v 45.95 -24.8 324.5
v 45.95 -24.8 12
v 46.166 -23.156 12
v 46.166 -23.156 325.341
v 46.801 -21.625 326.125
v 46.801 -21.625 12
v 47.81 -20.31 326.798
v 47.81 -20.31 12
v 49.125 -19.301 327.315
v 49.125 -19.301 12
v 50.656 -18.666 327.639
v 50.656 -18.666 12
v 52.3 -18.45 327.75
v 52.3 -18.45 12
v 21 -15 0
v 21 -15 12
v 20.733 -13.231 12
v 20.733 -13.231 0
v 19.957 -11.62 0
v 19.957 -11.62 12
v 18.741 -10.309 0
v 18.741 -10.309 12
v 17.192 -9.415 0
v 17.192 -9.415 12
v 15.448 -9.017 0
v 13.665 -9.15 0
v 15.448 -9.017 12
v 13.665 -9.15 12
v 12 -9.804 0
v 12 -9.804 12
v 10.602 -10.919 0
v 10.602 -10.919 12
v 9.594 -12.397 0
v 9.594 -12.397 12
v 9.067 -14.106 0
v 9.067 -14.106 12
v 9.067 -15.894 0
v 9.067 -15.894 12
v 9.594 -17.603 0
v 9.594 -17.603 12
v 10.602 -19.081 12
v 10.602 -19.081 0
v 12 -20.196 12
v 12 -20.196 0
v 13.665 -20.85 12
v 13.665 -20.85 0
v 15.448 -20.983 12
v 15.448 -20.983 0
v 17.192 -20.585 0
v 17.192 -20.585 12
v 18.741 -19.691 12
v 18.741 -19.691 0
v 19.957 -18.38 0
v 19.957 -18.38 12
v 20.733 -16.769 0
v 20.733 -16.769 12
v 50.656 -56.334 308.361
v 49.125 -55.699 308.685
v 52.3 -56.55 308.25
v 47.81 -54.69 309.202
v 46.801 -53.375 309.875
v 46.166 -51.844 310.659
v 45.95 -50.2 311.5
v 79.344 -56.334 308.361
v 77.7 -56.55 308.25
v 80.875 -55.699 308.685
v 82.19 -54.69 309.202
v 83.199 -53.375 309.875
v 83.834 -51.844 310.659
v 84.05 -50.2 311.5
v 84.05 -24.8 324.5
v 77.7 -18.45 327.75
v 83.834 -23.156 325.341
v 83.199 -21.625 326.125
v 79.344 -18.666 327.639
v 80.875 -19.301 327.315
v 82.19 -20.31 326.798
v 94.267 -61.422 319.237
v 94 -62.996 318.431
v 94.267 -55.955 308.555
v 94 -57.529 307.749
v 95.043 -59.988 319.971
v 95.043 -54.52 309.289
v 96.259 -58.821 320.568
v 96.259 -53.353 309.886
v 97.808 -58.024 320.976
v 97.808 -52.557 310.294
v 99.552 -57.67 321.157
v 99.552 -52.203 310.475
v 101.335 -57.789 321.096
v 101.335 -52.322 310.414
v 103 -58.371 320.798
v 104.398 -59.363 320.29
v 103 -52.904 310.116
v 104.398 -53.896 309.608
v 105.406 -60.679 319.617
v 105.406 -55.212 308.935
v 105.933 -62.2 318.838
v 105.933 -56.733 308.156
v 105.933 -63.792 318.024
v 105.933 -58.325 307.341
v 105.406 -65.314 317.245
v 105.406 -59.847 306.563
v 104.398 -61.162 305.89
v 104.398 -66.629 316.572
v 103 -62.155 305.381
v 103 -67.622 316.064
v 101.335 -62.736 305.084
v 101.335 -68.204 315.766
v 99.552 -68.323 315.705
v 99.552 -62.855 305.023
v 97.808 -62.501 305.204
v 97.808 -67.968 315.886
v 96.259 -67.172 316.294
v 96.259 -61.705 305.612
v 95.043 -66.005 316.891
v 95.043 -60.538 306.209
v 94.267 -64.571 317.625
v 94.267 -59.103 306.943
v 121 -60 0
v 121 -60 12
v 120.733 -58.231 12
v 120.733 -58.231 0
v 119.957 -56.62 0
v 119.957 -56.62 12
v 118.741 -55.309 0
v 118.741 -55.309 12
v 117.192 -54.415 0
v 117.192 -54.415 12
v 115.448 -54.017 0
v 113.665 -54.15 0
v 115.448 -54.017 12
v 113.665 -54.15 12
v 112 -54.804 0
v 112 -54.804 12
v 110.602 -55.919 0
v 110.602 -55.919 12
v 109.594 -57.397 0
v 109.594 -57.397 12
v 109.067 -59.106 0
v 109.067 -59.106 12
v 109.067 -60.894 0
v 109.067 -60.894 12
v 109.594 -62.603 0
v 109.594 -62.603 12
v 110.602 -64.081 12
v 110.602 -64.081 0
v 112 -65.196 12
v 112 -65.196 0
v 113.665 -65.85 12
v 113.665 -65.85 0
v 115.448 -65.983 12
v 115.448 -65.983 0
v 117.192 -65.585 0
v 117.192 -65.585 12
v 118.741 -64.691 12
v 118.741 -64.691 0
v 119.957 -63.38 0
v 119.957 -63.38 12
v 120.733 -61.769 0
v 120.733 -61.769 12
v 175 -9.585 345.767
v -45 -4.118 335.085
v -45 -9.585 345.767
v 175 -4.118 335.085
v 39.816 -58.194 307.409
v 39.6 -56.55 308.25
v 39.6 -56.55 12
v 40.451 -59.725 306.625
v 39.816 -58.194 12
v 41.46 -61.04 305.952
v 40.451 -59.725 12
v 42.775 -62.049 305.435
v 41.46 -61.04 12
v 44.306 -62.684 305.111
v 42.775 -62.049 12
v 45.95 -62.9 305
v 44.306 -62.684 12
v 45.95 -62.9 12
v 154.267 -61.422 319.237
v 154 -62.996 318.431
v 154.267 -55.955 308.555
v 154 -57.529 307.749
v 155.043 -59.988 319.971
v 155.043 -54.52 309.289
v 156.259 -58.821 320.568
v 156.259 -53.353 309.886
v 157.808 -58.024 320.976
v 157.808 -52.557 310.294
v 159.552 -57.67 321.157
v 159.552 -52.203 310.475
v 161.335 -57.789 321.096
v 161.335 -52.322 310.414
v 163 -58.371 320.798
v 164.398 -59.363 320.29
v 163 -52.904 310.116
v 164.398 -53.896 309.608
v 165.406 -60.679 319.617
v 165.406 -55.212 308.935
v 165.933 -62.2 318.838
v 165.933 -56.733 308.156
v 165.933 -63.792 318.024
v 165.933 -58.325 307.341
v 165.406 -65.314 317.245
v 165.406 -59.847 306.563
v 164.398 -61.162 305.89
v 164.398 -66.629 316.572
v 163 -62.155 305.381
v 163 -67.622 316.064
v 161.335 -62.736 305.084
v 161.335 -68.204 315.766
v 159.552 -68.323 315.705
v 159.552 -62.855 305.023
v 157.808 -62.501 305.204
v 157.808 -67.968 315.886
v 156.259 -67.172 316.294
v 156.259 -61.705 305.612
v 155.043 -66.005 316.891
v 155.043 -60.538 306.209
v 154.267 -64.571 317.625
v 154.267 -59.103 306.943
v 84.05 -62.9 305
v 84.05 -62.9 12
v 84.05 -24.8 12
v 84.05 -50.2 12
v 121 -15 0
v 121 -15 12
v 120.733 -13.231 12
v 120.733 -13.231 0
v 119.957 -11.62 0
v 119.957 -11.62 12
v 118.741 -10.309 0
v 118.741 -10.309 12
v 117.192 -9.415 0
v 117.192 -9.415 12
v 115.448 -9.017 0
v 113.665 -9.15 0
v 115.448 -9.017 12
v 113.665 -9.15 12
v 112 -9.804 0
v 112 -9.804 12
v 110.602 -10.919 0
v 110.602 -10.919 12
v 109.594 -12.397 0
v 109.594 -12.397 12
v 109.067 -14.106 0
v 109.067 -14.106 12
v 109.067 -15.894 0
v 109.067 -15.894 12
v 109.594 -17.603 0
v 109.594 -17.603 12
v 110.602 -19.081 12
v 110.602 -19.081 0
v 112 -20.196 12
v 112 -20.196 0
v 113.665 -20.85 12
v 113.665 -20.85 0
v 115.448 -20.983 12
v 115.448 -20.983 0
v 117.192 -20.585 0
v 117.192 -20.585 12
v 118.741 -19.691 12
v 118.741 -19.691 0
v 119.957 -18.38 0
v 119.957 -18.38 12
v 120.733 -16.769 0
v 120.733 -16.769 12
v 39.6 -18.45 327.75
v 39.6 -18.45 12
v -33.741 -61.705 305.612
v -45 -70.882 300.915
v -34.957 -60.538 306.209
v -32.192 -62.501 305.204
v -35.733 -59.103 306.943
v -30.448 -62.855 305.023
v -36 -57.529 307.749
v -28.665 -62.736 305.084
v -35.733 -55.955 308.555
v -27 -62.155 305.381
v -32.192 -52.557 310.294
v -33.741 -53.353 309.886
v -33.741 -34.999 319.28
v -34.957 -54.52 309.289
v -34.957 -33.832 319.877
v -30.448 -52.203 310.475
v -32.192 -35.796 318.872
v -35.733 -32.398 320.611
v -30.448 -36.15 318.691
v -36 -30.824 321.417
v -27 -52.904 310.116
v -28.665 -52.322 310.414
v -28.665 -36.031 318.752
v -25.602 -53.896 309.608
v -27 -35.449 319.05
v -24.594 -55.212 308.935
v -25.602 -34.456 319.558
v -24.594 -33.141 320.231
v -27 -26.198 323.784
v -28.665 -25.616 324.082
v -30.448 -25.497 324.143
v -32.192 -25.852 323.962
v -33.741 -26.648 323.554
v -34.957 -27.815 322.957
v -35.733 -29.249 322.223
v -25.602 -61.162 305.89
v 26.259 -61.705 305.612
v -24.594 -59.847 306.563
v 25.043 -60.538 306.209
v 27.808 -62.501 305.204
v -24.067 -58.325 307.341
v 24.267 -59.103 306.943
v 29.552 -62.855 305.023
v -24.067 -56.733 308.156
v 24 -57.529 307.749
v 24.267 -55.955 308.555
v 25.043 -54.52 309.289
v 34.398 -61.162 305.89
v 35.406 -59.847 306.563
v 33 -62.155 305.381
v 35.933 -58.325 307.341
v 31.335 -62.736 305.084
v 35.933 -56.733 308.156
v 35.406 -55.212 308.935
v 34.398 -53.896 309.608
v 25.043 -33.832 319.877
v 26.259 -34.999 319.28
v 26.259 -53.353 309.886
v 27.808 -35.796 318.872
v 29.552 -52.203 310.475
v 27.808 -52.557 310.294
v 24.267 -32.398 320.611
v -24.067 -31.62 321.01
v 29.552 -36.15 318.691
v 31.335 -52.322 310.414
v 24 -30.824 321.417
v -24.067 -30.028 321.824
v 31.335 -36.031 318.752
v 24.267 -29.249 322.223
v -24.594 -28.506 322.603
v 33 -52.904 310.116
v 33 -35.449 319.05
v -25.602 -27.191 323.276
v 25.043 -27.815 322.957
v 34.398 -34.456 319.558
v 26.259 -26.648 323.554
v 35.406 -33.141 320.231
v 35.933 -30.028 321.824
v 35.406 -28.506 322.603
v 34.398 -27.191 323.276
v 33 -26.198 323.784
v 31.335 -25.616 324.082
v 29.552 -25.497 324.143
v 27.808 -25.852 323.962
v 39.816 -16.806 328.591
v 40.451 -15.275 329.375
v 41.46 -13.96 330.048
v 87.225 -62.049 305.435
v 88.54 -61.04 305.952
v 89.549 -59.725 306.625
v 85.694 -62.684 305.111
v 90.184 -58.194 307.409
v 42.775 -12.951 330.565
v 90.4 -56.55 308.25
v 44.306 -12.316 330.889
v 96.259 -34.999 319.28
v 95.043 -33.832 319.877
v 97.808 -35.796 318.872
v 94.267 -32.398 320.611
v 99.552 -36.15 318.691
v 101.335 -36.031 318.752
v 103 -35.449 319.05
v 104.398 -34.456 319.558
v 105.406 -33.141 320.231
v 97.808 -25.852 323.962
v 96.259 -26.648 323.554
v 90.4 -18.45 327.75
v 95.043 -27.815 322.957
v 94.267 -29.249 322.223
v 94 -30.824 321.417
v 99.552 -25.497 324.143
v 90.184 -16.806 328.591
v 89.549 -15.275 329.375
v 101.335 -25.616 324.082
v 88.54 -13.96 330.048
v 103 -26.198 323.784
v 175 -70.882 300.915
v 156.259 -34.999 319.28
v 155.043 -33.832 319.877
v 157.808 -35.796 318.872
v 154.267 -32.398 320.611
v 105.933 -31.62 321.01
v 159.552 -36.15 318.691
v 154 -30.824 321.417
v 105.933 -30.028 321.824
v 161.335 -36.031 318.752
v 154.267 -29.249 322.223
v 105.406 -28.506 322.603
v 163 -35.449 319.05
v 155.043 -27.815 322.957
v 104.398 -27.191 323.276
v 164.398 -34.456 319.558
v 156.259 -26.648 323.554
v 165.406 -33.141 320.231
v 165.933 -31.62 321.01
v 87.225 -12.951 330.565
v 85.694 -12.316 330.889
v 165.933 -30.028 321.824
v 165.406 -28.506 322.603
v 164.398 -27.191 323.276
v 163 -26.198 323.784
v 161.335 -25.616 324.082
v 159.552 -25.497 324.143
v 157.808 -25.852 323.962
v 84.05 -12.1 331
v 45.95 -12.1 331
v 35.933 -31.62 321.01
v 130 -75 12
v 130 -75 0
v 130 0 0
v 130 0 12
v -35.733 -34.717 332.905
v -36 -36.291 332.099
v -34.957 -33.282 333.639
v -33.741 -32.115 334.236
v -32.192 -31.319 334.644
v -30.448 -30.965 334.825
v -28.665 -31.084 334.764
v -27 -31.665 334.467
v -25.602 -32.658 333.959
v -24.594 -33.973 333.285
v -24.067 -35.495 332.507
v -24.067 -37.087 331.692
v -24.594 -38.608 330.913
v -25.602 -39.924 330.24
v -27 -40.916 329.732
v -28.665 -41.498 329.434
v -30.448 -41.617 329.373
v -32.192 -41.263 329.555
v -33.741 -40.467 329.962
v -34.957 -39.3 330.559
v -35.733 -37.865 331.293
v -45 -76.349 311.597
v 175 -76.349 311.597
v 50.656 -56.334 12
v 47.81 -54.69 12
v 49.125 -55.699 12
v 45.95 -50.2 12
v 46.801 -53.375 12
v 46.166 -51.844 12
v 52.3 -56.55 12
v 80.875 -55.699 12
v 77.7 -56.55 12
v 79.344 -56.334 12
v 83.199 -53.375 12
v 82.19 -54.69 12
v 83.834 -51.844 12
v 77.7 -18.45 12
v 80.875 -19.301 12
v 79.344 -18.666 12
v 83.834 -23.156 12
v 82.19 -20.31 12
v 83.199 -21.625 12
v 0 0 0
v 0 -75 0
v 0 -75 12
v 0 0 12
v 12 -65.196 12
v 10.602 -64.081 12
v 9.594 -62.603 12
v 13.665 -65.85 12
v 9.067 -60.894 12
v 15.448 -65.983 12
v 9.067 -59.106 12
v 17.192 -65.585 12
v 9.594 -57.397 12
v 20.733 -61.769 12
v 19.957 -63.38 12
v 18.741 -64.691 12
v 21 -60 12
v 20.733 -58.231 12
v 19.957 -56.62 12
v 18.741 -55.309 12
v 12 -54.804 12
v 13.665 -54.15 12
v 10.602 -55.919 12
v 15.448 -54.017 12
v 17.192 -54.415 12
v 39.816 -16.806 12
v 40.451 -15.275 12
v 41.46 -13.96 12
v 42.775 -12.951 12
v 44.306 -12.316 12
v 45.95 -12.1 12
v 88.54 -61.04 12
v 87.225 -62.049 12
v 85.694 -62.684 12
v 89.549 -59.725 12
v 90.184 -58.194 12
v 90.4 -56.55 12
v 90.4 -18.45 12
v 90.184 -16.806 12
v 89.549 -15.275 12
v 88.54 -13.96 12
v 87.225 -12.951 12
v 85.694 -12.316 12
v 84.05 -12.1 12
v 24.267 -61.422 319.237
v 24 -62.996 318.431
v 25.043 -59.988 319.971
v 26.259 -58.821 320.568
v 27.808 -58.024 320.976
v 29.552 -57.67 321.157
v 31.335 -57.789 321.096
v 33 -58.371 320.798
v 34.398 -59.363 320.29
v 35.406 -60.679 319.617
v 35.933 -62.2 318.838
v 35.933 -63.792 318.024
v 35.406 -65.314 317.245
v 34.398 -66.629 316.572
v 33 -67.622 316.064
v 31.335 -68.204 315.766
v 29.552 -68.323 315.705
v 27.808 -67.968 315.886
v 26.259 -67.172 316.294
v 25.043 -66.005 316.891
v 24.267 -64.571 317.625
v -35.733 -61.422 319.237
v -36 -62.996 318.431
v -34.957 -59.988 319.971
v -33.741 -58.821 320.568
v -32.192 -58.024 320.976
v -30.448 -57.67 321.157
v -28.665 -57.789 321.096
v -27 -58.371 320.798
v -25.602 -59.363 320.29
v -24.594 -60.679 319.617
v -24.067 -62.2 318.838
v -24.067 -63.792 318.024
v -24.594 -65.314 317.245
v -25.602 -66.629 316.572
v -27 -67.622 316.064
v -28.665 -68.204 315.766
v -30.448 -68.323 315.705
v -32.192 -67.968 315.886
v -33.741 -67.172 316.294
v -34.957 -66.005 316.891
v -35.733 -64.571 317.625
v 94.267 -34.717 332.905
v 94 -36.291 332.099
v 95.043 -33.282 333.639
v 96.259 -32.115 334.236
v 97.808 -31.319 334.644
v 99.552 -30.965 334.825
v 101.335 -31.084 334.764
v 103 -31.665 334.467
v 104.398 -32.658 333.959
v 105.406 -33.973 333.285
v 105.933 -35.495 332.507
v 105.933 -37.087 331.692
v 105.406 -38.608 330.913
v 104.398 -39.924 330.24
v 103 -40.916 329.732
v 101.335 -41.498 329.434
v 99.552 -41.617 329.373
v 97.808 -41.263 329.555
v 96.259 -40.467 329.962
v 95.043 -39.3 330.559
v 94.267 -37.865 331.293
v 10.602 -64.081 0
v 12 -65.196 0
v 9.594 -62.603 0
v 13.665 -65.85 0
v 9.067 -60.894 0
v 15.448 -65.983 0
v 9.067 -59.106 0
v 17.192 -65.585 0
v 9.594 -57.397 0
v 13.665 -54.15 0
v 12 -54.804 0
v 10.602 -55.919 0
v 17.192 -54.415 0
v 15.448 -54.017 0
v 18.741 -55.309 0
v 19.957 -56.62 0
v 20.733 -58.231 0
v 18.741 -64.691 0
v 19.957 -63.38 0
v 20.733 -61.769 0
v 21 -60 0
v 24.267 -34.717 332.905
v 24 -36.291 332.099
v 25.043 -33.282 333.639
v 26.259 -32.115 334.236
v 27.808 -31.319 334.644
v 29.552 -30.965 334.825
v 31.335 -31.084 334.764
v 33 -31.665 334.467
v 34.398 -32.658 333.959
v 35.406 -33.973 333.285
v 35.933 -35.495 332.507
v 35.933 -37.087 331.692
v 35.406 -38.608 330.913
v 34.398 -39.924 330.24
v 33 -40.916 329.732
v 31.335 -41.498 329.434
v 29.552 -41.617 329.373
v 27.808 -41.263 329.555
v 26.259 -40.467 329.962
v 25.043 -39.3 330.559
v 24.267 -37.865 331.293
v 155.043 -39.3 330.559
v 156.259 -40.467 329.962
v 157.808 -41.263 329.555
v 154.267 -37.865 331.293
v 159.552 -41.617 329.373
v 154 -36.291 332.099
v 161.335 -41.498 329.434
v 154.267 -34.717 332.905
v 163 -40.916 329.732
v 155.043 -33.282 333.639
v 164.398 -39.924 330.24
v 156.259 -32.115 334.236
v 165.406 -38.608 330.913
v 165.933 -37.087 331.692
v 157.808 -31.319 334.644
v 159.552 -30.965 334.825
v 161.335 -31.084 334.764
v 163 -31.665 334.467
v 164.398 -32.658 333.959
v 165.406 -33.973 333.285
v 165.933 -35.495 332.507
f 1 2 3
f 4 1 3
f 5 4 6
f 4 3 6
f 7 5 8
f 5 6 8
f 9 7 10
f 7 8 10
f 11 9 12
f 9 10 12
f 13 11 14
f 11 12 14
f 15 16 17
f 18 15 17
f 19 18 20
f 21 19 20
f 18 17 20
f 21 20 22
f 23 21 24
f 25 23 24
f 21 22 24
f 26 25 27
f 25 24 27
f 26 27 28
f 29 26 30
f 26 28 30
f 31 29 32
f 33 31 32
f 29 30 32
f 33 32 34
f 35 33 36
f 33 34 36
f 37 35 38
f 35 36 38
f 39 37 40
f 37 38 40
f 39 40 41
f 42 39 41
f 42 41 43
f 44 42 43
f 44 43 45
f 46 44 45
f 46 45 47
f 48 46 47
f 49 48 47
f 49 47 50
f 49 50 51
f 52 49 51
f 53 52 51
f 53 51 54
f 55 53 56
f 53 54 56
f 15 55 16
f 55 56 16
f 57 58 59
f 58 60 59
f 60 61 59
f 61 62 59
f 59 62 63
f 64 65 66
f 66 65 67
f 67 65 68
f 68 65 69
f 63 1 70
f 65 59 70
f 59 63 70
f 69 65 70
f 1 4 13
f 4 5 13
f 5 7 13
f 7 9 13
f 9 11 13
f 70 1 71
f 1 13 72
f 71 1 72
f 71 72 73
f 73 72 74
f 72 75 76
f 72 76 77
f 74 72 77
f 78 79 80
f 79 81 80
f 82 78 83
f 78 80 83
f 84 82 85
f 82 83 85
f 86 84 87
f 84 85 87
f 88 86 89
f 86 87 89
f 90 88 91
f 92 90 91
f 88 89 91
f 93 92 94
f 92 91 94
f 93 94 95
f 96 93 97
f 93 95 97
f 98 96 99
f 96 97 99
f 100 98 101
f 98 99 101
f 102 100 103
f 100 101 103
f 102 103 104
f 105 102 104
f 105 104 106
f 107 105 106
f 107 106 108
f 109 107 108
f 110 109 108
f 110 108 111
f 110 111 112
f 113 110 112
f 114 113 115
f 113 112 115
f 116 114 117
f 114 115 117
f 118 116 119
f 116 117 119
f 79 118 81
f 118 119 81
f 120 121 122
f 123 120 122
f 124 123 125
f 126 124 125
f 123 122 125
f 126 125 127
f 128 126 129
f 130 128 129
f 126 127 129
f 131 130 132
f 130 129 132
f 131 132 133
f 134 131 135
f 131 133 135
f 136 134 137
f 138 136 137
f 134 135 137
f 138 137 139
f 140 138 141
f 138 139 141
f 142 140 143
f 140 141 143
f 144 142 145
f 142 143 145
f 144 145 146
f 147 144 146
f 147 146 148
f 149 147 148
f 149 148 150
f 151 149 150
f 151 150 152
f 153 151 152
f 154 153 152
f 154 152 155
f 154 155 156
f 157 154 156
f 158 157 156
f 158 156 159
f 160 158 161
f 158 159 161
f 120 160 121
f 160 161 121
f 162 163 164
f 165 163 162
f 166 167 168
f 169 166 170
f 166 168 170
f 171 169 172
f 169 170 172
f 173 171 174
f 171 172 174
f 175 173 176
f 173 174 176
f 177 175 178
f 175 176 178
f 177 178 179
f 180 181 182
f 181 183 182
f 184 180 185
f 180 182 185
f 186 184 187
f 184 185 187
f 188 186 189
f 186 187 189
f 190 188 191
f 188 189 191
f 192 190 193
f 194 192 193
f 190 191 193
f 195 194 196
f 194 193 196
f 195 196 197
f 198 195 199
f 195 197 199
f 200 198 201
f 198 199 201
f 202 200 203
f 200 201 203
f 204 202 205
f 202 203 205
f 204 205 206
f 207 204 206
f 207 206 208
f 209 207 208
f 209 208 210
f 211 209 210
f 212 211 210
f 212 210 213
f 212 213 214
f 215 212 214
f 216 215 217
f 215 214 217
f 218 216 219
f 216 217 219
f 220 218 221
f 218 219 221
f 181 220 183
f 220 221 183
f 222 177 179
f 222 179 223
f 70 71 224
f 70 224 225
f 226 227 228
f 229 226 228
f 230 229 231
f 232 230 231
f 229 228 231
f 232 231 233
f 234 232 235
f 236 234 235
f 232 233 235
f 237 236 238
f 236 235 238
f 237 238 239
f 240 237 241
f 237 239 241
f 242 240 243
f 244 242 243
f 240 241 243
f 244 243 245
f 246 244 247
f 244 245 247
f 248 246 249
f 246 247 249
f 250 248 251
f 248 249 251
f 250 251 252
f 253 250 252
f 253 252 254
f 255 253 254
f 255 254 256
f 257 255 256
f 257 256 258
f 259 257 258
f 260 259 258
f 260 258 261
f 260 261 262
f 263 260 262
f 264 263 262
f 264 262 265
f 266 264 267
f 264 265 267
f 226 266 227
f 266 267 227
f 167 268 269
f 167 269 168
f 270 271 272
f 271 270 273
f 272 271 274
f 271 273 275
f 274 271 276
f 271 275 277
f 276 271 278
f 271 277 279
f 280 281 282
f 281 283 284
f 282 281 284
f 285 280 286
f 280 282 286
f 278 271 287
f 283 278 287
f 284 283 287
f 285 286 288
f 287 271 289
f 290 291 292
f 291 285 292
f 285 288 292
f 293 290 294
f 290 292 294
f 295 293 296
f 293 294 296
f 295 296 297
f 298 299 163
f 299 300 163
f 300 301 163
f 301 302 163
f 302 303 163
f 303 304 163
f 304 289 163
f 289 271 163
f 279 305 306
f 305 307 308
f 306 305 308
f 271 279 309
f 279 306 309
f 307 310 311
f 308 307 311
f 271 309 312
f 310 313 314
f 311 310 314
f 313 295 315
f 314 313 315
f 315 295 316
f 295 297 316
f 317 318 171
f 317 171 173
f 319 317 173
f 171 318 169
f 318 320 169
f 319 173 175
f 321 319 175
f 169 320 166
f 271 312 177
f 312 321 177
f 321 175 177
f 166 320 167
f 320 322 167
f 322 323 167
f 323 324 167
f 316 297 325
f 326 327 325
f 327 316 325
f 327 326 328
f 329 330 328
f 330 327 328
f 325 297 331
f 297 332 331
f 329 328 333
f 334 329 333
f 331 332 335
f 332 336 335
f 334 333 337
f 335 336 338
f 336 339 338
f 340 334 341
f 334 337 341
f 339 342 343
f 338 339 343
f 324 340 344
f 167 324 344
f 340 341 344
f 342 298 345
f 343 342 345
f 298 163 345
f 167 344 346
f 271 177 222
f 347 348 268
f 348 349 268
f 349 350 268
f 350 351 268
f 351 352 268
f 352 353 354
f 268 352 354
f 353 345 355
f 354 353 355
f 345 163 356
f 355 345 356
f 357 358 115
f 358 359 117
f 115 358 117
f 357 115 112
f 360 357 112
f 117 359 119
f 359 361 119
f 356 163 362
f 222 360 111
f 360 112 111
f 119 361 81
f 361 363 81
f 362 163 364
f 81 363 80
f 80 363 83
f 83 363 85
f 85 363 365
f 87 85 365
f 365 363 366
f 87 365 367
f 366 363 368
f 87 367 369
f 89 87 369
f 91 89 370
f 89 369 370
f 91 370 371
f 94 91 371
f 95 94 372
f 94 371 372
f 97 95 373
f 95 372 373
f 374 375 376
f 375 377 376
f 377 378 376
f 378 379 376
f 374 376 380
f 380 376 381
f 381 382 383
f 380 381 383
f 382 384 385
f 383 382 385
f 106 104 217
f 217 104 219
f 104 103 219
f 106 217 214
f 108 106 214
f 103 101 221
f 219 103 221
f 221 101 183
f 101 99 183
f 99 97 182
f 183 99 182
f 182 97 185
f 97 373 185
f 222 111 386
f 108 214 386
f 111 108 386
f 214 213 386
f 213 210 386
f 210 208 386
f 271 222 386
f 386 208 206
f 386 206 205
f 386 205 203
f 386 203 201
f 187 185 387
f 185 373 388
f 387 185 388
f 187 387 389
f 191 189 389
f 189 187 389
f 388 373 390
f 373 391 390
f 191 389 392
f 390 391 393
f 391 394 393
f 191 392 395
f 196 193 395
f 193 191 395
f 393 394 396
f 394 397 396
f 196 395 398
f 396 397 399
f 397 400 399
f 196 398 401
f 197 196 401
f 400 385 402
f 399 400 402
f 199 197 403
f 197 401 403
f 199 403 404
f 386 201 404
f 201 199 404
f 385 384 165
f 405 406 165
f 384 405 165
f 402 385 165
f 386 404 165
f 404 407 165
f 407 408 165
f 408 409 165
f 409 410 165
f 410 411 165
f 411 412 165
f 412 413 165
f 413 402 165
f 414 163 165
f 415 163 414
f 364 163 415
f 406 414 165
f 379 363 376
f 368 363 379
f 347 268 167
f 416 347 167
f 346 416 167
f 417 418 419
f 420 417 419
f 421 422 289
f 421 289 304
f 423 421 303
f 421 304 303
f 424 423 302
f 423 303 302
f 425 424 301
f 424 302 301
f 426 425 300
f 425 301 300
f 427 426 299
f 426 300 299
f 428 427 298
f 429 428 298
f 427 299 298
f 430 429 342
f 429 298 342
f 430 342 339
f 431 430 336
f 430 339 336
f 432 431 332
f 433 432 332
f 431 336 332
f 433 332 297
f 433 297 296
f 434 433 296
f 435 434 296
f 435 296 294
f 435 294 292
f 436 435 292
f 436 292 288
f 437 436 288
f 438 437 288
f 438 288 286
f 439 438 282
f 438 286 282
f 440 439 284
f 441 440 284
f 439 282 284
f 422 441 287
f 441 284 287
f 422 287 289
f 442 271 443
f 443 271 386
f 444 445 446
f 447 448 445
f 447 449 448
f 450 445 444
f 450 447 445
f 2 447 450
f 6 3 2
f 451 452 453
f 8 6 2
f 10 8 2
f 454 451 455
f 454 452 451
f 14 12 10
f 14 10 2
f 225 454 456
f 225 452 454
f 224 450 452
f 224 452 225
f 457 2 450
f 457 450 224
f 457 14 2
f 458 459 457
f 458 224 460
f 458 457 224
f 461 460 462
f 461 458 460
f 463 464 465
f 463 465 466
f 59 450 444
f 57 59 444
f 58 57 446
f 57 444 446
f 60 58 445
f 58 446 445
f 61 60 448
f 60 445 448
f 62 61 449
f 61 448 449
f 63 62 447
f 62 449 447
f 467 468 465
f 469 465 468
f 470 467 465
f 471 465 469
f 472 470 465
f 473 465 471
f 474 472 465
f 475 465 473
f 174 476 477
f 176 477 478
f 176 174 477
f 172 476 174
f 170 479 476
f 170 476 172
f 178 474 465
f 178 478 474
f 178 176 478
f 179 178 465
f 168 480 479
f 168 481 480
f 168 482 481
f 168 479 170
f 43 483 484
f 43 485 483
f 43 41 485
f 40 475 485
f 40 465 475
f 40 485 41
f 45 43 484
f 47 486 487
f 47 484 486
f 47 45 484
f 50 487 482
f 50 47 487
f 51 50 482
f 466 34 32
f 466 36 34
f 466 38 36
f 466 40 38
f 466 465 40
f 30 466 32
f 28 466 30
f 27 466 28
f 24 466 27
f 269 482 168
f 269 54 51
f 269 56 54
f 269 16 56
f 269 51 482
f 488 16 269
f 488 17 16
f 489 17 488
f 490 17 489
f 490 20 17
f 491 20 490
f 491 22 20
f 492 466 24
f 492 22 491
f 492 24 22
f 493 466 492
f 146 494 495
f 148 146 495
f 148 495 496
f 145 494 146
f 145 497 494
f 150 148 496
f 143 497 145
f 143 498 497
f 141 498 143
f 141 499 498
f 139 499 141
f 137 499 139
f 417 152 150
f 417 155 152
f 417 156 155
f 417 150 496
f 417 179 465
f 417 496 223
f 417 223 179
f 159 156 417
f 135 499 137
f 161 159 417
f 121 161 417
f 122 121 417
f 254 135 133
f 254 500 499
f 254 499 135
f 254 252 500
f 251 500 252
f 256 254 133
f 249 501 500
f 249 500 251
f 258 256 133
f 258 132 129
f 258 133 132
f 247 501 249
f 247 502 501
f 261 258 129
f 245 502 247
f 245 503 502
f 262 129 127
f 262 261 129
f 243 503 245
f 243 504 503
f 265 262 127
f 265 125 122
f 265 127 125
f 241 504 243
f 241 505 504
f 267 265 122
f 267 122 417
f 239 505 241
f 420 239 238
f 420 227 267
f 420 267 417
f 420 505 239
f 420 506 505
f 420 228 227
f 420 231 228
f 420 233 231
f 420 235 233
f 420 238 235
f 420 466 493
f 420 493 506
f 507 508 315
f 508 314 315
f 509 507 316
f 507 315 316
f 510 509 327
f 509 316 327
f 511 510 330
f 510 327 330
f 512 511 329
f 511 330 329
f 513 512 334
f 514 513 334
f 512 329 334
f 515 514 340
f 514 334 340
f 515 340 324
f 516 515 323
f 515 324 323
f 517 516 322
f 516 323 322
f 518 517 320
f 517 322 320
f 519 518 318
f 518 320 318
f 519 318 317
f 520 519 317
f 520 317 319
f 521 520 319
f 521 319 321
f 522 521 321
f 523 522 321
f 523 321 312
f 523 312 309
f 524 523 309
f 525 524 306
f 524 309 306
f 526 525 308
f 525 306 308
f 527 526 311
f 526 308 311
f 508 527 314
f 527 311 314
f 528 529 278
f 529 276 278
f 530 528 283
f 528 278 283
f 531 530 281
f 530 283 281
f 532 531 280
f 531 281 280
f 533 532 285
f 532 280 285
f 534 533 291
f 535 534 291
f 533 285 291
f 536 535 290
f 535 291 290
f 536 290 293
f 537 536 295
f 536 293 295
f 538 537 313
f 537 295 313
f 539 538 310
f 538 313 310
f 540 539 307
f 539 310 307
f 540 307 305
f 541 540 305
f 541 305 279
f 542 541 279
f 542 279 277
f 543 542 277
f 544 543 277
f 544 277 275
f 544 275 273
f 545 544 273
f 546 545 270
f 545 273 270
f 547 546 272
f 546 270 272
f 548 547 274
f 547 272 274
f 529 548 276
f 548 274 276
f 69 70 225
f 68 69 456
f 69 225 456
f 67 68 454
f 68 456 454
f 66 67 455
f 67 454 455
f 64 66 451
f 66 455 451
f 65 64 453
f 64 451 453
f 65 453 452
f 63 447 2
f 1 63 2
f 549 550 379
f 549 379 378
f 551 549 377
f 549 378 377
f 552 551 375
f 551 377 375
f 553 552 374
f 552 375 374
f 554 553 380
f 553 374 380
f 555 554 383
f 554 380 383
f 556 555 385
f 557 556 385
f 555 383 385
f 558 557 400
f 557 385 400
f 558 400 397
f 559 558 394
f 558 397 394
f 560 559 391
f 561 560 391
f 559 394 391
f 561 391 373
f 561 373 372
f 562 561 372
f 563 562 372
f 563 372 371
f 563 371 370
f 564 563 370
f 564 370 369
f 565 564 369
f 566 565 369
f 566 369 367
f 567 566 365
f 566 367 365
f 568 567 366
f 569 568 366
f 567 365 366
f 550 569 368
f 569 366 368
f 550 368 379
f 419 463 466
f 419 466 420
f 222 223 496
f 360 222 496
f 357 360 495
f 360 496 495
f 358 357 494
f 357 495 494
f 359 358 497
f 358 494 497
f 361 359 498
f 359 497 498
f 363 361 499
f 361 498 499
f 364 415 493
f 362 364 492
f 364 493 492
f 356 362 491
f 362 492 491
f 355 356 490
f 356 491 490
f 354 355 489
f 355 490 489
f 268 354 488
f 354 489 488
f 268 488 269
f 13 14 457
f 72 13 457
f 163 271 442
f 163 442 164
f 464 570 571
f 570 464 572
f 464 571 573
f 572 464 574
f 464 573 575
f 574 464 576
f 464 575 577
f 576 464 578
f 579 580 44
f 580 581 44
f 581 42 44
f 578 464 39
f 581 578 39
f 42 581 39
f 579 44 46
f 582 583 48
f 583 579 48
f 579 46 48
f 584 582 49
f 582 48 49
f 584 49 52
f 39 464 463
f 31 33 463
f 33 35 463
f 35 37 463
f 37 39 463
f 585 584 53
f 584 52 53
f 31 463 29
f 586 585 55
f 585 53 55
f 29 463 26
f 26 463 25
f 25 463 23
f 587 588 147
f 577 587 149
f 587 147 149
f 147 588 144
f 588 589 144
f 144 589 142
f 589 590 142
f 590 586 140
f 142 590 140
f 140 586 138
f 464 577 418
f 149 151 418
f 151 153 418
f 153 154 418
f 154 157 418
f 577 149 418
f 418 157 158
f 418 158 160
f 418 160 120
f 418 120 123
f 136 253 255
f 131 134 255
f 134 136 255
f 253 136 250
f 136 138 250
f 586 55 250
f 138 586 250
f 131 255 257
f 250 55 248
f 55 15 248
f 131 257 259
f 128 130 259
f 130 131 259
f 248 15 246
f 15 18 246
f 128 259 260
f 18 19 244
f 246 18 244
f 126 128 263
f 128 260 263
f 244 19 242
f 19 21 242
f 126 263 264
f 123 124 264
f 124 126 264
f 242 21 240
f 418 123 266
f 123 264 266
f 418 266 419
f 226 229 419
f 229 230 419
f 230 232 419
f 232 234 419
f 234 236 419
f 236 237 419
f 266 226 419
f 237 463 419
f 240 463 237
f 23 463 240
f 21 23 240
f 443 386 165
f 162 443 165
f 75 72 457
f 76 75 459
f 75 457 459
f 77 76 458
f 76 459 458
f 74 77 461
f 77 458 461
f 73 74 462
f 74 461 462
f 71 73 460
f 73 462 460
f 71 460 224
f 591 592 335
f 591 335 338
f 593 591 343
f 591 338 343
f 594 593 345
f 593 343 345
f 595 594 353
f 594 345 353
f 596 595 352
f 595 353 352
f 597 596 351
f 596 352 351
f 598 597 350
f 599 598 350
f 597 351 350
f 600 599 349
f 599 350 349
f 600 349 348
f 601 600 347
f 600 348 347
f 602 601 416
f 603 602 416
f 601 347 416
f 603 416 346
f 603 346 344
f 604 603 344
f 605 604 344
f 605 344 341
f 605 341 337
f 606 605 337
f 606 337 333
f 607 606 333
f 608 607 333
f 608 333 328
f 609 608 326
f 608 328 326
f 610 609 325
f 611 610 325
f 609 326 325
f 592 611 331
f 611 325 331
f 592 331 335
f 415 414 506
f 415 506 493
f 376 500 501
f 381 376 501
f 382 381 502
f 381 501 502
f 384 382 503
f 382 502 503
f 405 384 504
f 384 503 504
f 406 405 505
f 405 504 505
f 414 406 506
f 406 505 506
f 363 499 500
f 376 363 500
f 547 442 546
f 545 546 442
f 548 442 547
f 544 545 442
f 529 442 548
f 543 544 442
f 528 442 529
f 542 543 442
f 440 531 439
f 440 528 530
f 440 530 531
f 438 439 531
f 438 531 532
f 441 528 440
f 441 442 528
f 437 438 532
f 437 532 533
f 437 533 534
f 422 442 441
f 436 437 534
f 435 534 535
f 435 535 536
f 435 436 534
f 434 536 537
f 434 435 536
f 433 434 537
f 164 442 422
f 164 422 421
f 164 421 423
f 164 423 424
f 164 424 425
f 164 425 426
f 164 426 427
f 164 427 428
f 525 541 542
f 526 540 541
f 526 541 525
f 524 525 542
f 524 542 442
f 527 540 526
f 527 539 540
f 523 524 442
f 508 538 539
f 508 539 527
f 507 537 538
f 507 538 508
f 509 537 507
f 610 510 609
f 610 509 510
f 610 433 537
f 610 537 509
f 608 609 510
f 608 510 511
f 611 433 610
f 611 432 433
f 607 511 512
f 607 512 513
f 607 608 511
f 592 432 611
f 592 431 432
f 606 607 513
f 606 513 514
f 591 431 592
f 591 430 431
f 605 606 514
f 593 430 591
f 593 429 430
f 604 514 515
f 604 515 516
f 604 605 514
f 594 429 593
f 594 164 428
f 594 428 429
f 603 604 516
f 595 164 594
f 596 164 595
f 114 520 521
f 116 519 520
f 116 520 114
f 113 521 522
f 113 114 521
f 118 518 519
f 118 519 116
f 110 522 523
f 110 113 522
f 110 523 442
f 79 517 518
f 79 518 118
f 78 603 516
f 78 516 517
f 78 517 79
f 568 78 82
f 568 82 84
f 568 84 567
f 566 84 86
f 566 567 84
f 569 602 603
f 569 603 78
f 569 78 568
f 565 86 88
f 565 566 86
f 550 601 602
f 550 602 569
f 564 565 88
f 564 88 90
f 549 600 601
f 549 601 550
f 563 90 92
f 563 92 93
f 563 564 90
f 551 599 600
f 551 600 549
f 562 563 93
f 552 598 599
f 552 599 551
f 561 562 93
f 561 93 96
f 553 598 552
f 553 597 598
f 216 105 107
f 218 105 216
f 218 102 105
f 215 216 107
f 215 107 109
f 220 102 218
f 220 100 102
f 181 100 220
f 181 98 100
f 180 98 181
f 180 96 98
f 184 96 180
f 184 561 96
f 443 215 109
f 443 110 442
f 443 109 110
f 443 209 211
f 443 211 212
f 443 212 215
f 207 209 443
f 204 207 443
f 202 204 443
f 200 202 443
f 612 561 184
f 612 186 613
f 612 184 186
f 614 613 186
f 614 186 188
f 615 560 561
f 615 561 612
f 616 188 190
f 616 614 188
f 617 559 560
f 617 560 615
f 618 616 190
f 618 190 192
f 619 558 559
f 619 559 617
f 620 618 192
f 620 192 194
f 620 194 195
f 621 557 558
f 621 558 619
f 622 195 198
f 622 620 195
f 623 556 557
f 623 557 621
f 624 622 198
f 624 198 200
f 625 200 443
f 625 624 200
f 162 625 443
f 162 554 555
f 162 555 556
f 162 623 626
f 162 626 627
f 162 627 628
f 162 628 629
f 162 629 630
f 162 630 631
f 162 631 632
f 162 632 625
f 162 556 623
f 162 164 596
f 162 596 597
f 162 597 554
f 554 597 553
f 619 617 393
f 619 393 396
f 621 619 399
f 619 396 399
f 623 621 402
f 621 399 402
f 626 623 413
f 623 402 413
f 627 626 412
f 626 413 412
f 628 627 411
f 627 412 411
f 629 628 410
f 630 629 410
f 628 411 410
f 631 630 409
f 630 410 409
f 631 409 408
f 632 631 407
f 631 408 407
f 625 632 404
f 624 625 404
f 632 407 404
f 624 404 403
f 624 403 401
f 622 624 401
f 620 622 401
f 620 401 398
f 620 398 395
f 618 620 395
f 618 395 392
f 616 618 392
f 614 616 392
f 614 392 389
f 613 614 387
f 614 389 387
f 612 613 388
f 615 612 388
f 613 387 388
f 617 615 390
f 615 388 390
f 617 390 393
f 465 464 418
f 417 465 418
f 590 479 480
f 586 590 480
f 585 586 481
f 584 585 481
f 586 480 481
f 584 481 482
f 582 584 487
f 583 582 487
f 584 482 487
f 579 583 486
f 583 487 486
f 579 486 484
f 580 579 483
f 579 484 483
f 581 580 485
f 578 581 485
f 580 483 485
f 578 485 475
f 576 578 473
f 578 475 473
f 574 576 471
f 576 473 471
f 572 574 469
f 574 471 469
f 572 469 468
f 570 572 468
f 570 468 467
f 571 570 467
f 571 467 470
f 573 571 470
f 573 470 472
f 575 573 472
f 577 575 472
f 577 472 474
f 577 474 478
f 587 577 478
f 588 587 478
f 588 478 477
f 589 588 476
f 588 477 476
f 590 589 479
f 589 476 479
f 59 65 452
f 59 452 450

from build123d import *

# Parameters (mm, degrees)
F0_W      = 130
F0_H      = 75
F1_DEPTH  = 12
F3_DEPTH  = 319
F5_DEPTH  = 100
F6_W      = 220
F6_H      = 75
F7_DEPTH  = 12
F9_D      = 12
F9_DEPTH  = 12
F9_TIP    = 3.6051637142
F11_D     = 12
F11_DEPTH = 12
F11_TIP   = 3.6051637142


# Not quite as in the source:
# - a feature names something its author has since deleted; it is built from what else it names


with BuildPart() as f1:
    # F0 (on Top) → F1 (new body)
    with BuildSketch(Plane.XY):
        with Locations((65, -37.5)):
            Rectangle(F0_W, F0_H)
    extrude(amount=F1_DEPTH)

    # F2 (on face) → F3 (join)
    with BuildSketch(Plane.XY.offset(12)):
        with BuildLine():
            ThreePointArc((90.4, -18.45), (88.5401280605, -13.9598719395), (84.05, -12.1))
            Line((84.05, -12.1), (45.95, -12.1))
            ThreePointArc((45.95, -12.1), (41.4598719395, -13.9598719395), (39.6, -18.45))
            Line((39.6, -18.45), (39.6, -56.55))
            ThreePointArc((39.6, -56.55), (41.4598719395, -61.0401280605), (45.95, -62.9))
            Line((45.95, -62.9), (84.05, -62.9))
            ThreePointArc((84.05, -62.9), (88.5401280605, -61.0401280605), (90.4, -56.55))
            Line((90.4, -56.55), (90.4, -18.45))
        make_face()
        with BuildLine():
            Line((52.3, -18.45), (77.7, -18.45))
            ThreePointArc((77.7, -18.45), (82.1901280605, -20.3098719395), (84.05, -24.8))
            Line((84.05, -24.8), (84.05, -50.2))
            ThreePointArc((84.05, -50.2), (82.1901280605, -54.6901280605), (77.7, -56.55))
            Line((77.7, -56.55), (52.3, -56.55))
            ThreePointArc((52.3, -56.55), (47.8098719395, -54.6901280605), (45.95, -50.2))
            Line((45.95, -50.2), (45.95, -24.8))
            ThreePointArc((45.95, -24.8), (47.8098719395, -20.3098719395), (52.3, -18.45))
        make_face(mode=Mode.SUBTRACT)
    extrude(amount=F3_DEPTH)

    # F4 (on face) → F5 (cut)
    with BuildSketch(Plane.YZ.offset(90.4)):
        Polygon((-62.9, 305), (-12.1, 331), (-62.9, 331), align=None)
    extrude(amount=-F5_DEPTH, mode=Mode.SUBTRACT)

    # F6 (on face) → F7 (join)
    with BuildSketch(Plane(origin=(0, -136.7557973863, 267.1997887393), x_dir=(1, 0, 0), z_dir=(0, -0.4556049895, 0.8901820564))):
        with Locations((65, 111.5005595453)):
            Rectangle(F6_W, F6_H)
        with BuildLine():
            Line((90.4, 132.9006763674), (90.4, 90.1004427232))
            add(Edge.make_bspline(
                [(90.4, 90.1004427232), (90.4, 82.9670704491), (84.05, 82.9670704491)],
                knots=[4.7123889804, 4.7123889804, 4.7123889804, 6.2831853072, 6.2831853072, 6.2831853072], degree=2, weights=[1, 0.7071067812, 1]))
            Line((84.05, 82.9670704491), (45.95, 82.9670704491))
            add(Edge.make_bspline(
                [(45.95, 82.9670704491), (39.6, 82.9670704491), (39.6, 90.1004427232)],
                knots=[0, 0, 0, 1.5707963268, 1.5707963268, 1.5707963268], degree=2, weights=[1, 0.7071067812, 1]))
            Line((39.6, 90.1004427232), (39.6, 132.9006763674))
            add(Edge.make_bspline(
                [(39.6, 132.9006763674), (39.6, 140.0340486414), (45.95, 140.0340486414)],
                knots=[1.5707963268, 1.5707963268, 1.5707963268, 3.1415926536, 3.1415926536, 3.1415926536], degree=2, weights=[1, 0.7071067812, 1]))
            Line((45.95, 140.0340486414), (84.05, 140.0340486414))
            add(Edge.make_bspline(
                [(84.05, 140.0340486414), (90.4, 140.0340486414), (90.4, 132.9006763674)],
                knots=[3.1415926536, 3.1415926536, 3.1415926536, 4.7123889804, 4.7123889804, 4.7123889804], degree=2, weights=[1, 0.7071067812, 1]))
        make_face(mode=Mode.SUBTRACT)
        with BuildLine():
            add(Edge.make_bspline(
                [(90.4, 90.1004427232), (90.4, 82.9670704491), (84.05, 82.9670704491)],
                knots=[4.7123889804, 4.7123889804, 4.7123889804, 6.2831853072, 6.2831853072, 6.2831853072], degree=2, weights=[1, 0.7071067812, 1]))
            Line((90.4, 90.1004427232), (90.4, 132.9006763674))
            add(Edge.make_bspline(
                [(84.05, 140.0340486414), (90.4, 140.0340486414), (90.4, 132.9006763674)],
                knots=[3.1415926536, 3.1415926536, 3.1415926536, 4.7123889804, 4.7123889804, 4.7123889804], degree=2, weights=[1, 0.7071067812, 1]))
            Line((84.05, 140.0340486414), (45.95, 140.0340486414))
            add(Edge.make_bspline(
                [(39.6, 132.9006763674), (39.6, 140.0340486414), (45.95, 140.0340486414)],
                knots=[1.5707963268, 1.5707963268, 1.5707963268, 3.1415926536, 3.1415926536, 3.1415926536], degree=2, weights=[1, 0.7071067812, 1]))
            Line((39.6, 132.9006763674), (39.6, 90.1004427232))
            add(Edge.make_bspline(
                [(45.95, 82.9670704491), (39.6, 82.9670704491), (39.6, 90.1004427232)],
                knots=[0, 0, 0, 1.5707963268, 1.5707963268, 1.5707963268], degree=2, weights=[1, 0.7071067812, 1]))
            Line((45.95, 82.9670704491), (84.05, 82.9670704491))
        make_face()
        with BuildLine():
            Line((52.3, 132.9006763674), (77.7, 132.9006763674))
            add(Edge.make_bspline(
                [(77.7, 132.9006763674), (84.05, 132.9006763674), (84.05, 125.7673040934)],
                knots=[3.1415926536, 3.1415926536, 3.1415926536, 4.7123889804, 4.7123889804, 4.7123889804], degree=2, weights=[1, 0.7071067812, 1]))
            Line((84.05, 125.7673040934), (84.05, 97.2338149972))
            add(Edge.make_bspline(
                [(84.05, 97.2338149972), (84.05, 90.1004427232), (77.7, 90.1004427232)],
                knots=[4.7123889804, 4.7123889804, 4.7123889804, 6.2831853072, 6.2831853072, 6.2831853072], degree=2, weights=[1, 0.7071067812, 1]))
            Line((77.7, 90.1004427232), (52.3, 90.1004427232))
            add(Edge.make_bspline(
                [(52.3, 90.1004427232), (45.95, 90.1004427232), (45.95, 97.2338149972)],
                knots=[0, 0, 0, 1.5707963268, 1.5707963268, 1.5707963268], degree=2, weights=[1, 0.7071067812, 1]))
            Line((45.95, 97.2338149972), (45.95, 125.7673040934))
            add(Edge.make_bspline(
                [(45.95, 125.7673040934), (45.95, 132.9006763674), (52.3, 132.9006763674)],
                knots=[1.5707963268, 1.5707963268, 1.5707963268, 3.1415926536, 3.1415926536, 3.1415926536], degree=2, weights=[1, 0.7071067812, 1]))
        make_face(mode=Mode.SUBTRACT)
        with BuildLine():
            add(Edge.make_bspline(
                [(77.7, 132.9006763674), (84.05, 132.9006763674), (84.05, 125.7673040934)],
                knots=[3.1415926536, 3.1415926536, 3.1415926536, 4.7123889804, 4.7123889804, 4.7123889804], degree=2, weights=[1, 0.7071067812, 1]))
            Line((77.7, 132.9006763674), (52.3, 132.9006763674))
            add(Edge.make_bspline(
                [(45.95, 125.7673040934), (45.95, 132.9006763674), (52.3, 132.9006763674)],
                knots=[1.5707963268, 1.5707963268, 1.5707963268, 3.1415926536, 3.1415926536, 3.1415926536], degree=2, weights=[1, 0.7071067812, 1]))
            Line((45.95, 125.7673040934), (45.95, 97.2338149972))
            add(Edge.make_bspline(
                [(52.3, 90.1004427232), (45.95, 90.1004427232), (45.95, 97.2338149972)],
                knots=[0, 0, 0, 1.5707963268, 1.5707963268, 1.5707963268], degree=2, weights=[1, 0.7071067812, 1]))
            Line((52.3, 90.1004427232), (77.7, 90.1004427232))
            add(Edge.make_bspline(
                [(84.05, 97.2338149972), (84.05, 90.1004427232), (77.7, 90.1004427232)],
                knots=[4.7123889804, 4.7123889804, 4.7123889804, 6.2831853072, 6.2831853072, 6.2831853072], degree=2, weights=[1, 0.7071067812, 1]))
            Line((84.05, 97.2338149972), (84.05, 125.7673040934))
        make_face()
    extrude(amount=F7_DEPTH)

    # F9
    with Locations(Plane(origin=(0, -142.2230572602, 277.8819734162), x_dir=(1, 0, 0), z_dir=(0, -0.4556049895, 0.8901820564))):
        with Locations((-30, 89.0005595453), (100, 89.0005595453), (160, 89.0005595453), (160, 119.0005595453), (100, 119.0005595453), (30, 119.0005595453), (-30, 119.0005595453), (30, 89.0005595453)):
            Hole(F9_D / 2, depth=F9_DEPTH)
            with Locations((0, 0, -(F9_DEPTH + F9_TIP / 2))):  # 118° drill point
                Cone(0, F9_D / 2, F9_TIP, mode=Mode.SUBTRACT)

    # F11 (one way)
    with BuildSketch(Plane.XY.offset(12)):
        with Locations((15, -15), (15, -60), (115, -60), (115, -15)):
            Circle(F11_D / 2)
    extrude(amount=-F11_DEPTH, mode=Mode.SUBTRACT)
    with Locations(Plane.XY.offset(12)):
        with Locations((15, -15), (15, -60), (115, -60), (115, -15)):
            with Locations((0, 0, -(F11_DEPTH + F11_TIP / 2))):  # 118° drill point
                Cone(0, F11_D / 2, F11_TIP, mode=Mode.SUBTRACT)


solid = f1.part
